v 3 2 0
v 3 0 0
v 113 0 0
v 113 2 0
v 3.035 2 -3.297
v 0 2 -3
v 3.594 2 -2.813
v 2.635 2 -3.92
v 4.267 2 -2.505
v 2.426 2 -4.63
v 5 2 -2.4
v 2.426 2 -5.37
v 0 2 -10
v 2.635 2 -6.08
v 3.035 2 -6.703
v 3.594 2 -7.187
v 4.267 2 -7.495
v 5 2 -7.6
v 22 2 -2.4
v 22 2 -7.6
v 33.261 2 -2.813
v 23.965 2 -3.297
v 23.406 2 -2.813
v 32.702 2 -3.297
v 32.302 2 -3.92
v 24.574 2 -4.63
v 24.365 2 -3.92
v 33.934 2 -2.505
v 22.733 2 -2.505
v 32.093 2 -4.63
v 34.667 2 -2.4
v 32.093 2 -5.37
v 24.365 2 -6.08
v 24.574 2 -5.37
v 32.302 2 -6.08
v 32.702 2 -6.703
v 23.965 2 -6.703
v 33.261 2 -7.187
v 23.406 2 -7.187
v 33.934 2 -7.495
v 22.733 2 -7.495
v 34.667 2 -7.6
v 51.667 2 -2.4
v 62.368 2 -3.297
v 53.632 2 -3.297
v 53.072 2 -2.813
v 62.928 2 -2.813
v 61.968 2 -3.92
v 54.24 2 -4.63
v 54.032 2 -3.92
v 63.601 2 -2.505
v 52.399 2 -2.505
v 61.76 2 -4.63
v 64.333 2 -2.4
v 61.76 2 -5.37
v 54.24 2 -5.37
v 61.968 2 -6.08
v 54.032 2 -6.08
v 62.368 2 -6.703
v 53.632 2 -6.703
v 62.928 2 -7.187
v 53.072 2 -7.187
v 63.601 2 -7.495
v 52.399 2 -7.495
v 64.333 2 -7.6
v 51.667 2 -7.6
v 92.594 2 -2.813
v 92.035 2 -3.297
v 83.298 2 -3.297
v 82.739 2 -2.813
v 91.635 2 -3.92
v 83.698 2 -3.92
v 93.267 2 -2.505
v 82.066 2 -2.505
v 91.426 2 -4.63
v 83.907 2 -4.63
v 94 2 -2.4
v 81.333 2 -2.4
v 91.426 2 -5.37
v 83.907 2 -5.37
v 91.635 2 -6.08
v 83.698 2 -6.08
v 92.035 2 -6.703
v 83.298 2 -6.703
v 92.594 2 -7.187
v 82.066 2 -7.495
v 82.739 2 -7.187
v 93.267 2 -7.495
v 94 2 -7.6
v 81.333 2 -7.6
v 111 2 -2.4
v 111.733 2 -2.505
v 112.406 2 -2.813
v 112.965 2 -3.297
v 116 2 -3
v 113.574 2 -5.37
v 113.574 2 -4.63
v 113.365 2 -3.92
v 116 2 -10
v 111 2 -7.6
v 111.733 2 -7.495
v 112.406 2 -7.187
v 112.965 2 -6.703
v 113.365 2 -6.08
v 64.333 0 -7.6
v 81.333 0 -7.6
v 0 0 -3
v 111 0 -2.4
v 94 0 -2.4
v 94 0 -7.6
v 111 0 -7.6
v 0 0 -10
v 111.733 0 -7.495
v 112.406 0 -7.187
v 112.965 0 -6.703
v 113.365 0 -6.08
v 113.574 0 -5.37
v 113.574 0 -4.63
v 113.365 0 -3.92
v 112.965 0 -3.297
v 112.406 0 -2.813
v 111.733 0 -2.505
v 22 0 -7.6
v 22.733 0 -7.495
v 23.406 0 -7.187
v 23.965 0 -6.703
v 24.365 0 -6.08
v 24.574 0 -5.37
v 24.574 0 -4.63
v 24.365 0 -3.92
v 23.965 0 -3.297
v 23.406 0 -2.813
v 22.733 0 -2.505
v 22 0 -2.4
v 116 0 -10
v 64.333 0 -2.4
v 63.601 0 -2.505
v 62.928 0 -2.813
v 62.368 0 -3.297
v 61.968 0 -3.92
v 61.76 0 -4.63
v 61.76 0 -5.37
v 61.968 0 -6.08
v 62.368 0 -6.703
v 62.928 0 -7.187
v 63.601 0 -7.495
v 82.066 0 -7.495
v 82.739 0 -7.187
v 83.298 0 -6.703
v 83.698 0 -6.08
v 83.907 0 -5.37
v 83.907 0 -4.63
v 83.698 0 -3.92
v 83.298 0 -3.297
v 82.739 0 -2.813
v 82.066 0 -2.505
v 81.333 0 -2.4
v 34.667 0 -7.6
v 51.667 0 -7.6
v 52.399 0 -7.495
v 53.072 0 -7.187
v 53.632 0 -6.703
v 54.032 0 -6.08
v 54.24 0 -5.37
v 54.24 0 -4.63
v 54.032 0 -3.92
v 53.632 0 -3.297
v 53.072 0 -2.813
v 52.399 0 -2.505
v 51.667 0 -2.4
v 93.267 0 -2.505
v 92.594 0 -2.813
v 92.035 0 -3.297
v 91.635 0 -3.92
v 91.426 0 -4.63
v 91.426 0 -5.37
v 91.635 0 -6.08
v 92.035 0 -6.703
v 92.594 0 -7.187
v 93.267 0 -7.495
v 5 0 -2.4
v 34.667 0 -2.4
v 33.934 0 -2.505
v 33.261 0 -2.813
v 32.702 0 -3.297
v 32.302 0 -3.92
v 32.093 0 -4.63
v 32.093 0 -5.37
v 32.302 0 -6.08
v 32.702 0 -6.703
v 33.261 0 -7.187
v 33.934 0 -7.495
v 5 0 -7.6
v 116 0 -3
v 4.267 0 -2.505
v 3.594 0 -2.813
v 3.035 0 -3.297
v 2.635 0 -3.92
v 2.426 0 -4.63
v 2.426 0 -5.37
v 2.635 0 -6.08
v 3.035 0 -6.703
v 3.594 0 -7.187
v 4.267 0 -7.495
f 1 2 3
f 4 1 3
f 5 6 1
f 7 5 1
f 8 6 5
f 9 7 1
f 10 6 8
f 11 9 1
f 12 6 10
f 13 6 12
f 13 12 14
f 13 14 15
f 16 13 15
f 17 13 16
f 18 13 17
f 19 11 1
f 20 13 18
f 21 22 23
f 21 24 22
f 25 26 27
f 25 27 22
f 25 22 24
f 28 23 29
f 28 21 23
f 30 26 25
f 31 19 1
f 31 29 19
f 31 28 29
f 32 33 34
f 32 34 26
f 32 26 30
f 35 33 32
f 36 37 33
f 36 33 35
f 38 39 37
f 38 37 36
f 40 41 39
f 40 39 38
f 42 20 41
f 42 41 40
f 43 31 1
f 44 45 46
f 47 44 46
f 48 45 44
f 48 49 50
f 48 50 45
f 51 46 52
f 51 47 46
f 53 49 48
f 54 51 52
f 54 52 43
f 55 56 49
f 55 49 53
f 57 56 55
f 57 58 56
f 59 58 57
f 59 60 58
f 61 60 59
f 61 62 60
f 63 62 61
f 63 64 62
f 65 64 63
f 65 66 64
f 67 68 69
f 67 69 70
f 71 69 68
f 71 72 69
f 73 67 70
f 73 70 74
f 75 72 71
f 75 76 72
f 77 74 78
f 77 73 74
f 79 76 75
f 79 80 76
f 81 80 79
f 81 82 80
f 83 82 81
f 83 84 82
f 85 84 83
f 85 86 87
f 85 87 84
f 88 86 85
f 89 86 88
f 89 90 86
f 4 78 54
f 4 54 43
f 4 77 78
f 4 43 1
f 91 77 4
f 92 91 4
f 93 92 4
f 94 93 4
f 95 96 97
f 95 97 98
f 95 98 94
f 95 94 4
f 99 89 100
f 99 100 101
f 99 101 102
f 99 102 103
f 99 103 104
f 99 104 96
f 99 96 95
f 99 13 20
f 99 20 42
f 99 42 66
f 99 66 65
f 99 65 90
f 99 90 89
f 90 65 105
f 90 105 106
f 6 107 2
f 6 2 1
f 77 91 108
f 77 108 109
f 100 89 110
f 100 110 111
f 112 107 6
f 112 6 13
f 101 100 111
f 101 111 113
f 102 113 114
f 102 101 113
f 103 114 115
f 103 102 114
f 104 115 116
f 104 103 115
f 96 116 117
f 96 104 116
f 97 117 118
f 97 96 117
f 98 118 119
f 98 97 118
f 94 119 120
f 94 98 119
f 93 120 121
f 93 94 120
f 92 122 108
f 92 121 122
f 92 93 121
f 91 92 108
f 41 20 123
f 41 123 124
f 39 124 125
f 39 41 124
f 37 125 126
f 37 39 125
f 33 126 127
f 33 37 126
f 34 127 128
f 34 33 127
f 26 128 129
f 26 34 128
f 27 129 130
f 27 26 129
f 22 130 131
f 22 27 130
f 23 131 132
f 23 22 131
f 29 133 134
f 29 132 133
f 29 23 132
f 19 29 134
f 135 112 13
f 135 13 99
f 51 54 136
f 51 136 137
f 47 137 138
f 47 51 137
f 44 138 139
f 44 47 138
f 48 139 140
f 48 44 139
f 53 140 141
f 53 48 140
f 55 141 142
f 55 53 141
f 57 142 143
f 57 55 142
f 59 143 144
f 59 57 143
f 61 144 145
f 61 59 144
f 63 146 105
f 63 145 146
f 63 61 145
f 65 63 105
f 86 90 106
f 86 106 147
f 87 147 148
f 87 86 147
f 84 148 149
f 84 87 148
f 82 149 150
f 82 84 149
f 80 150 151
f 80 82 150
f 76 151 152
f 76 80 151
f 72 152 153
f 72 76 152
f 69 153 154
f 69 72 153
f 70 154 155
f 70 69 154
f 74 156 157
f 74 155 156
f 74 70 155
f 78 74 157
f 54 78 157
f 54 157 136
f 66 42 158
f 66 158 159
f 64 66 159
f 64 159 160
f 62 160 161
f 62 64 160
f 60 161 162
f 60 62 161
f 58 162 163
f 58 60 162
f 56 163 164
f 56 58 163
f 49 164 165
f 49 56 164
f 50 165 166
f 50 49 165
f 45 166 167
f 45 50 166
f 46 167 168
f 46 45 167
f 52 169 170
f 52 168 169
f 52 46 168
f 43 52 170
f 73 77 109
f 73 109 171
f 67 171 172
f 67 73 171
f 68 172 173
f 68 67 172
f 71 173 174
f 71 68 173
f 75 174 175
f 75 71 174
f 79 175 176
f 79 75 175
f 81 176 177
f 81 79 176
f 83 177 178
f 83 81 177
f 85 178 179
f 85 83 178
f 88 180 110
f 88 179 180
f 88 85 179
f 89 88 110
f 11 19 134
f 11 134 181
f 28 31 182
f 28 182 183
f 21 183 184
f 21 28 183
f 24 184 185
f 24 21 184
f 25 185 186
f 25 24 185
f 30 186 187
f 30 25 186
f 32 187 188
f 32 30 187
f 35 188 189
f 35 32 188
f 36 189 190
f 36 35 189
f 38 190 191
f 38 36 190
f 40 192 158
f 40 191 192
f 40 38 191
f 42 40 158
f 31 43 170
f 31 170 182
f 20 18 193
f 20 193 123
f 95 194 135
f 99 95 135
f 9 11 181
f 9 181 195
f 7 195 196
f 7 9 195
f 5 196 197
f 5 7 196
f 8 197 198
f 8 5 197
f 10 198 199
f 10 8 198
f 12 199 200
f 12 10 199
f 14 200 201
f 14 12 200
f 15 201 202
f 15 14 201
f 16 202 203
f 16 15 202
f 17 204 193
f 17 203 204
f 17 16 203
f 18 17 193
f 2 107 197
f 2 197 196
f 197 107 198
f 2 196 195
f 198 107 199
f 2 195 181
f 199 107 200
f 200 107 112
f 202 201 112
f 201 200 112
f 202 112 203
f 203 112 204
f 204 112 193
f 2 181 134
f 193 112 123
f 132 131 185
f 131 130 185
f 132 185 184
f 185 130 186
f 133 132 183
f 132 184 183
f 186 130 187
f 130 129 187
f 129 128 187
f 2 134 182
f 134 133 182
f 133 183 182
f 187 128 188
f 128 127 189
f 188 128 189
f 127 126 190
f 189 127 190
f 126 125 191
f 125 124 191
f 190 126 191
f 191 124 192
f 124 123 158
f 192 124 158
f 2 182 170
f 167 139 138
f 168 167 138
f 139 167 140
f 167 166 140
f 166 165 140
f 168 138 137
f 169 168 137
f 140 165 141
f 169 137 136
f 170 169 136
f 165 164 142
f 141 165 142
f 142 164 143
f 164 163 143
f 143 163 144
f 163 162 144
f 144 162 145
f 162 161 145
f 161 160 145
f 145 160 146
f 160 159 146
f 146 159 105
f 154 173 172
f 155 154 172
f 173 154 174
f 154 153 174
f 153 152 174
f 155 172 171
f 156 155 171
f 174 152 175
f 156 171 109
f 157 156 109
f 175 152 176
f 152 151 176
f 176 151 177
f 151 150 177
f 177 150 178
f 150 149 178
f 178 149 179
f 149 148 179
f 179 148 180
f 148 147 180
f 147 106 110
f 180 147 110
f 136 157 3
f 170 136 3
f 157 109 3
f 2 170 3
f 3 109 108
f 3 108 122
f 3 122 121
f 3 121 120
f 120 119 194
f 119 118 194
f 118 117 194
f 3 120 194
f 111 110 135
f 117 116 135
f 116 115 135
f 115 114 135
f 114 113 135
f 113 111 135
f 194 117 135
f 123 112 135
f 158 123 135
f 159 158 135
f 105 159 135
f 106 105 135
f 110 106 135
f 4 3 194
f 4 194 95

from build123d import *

# Parameters (mm, degrees)
SKETCH_1_W          = 116
SKETCH_1_H          = 10
EXTRUDE_1_DEPTH     = 2
CUT_EXTRUDE_1_DEPTH = 10
CHAMFER_1_SIZE      = 3


with BuildPart() as part:
    # 스케치1 → 보스-돌출1 (new body)
    with BuildSketch(Plane(origin=(0, 0, 0), x_dir=(1, 0, 0), z_dir=(0, 1, 0))):
        with Locations((58, 5)):
            Rectangle(SKETCH_1_W, SKETCH_1_H)
    extrude(amount=EXTRUDE_1_DEPTH)

    # 스케치2 → 컷-돌출1 (cut)
    with BuildSketch(Plane(origin=(0, 2, 0), x_dir=(1, 0, 0), z_dir=(0, 1, 0))):
        with BuildLine():
            Line((5, 7.6), (22, 7.6))
            ThreePointArc((22, 7.6), (24.6, 5), (22, 2.4))
            Line((22, 2.4), (5, 2.4))
            ThreePointArc((5, 2.4), (2.4, 5), (5, 7.6))
        make_face()
        with BuildLine():
            Line((34.666666667, 7.6), (51.666666667, 7.6))
            ThreePointArc((51.666666667, 7.6), (54.266666667, 5), (51.666666667, 2.4))
            Line((51.666666667, 2.4), (34.666666667, 2.4))
            ThreePointArc((34.666666667, 2.4), (32.066666667, 5), (34.666666667, 7.6))
        make_face()
        with BuildLine():
            Line((64.333333333, 7.6), (81.333333333, 7.6))
            ThreePointArc((81.333333333, 7.6), (83.933333333, 5), (81.333333333, 2.4))
            Line((81.333333333, 2.4), (64.333333333, 2.4))
            ThreePointArc((64.333333333, 2.4), (61.733333333, 5), (64.333333333, 7.6))
        make_face()
        with BuildLine():
            Line((94, 7.6), (111, 7.6))
            ThreePointArc((111, 7.6), (113.6, 5), (111, 2.4))
            Line((111, 2.4), (94, 2.4))
            ThreePointArc((94, 2.4), (91.4, 5), (94, 7.6))
        make_face()
    extrude(amount=-CUT_EXTRUDE_1_DEPTH, mode=Mode.SUBTRACT)

    # 모따기1
    chamfer_1_edges = [part.edges().sort_by_distance(p)[0] for p in [
        (116, 1, 0),
        (0, 1, 0),
    ]]
    chamfer(chamfer_1_edges, length=CHAMFER_1_SIZE)


solid = part.part
